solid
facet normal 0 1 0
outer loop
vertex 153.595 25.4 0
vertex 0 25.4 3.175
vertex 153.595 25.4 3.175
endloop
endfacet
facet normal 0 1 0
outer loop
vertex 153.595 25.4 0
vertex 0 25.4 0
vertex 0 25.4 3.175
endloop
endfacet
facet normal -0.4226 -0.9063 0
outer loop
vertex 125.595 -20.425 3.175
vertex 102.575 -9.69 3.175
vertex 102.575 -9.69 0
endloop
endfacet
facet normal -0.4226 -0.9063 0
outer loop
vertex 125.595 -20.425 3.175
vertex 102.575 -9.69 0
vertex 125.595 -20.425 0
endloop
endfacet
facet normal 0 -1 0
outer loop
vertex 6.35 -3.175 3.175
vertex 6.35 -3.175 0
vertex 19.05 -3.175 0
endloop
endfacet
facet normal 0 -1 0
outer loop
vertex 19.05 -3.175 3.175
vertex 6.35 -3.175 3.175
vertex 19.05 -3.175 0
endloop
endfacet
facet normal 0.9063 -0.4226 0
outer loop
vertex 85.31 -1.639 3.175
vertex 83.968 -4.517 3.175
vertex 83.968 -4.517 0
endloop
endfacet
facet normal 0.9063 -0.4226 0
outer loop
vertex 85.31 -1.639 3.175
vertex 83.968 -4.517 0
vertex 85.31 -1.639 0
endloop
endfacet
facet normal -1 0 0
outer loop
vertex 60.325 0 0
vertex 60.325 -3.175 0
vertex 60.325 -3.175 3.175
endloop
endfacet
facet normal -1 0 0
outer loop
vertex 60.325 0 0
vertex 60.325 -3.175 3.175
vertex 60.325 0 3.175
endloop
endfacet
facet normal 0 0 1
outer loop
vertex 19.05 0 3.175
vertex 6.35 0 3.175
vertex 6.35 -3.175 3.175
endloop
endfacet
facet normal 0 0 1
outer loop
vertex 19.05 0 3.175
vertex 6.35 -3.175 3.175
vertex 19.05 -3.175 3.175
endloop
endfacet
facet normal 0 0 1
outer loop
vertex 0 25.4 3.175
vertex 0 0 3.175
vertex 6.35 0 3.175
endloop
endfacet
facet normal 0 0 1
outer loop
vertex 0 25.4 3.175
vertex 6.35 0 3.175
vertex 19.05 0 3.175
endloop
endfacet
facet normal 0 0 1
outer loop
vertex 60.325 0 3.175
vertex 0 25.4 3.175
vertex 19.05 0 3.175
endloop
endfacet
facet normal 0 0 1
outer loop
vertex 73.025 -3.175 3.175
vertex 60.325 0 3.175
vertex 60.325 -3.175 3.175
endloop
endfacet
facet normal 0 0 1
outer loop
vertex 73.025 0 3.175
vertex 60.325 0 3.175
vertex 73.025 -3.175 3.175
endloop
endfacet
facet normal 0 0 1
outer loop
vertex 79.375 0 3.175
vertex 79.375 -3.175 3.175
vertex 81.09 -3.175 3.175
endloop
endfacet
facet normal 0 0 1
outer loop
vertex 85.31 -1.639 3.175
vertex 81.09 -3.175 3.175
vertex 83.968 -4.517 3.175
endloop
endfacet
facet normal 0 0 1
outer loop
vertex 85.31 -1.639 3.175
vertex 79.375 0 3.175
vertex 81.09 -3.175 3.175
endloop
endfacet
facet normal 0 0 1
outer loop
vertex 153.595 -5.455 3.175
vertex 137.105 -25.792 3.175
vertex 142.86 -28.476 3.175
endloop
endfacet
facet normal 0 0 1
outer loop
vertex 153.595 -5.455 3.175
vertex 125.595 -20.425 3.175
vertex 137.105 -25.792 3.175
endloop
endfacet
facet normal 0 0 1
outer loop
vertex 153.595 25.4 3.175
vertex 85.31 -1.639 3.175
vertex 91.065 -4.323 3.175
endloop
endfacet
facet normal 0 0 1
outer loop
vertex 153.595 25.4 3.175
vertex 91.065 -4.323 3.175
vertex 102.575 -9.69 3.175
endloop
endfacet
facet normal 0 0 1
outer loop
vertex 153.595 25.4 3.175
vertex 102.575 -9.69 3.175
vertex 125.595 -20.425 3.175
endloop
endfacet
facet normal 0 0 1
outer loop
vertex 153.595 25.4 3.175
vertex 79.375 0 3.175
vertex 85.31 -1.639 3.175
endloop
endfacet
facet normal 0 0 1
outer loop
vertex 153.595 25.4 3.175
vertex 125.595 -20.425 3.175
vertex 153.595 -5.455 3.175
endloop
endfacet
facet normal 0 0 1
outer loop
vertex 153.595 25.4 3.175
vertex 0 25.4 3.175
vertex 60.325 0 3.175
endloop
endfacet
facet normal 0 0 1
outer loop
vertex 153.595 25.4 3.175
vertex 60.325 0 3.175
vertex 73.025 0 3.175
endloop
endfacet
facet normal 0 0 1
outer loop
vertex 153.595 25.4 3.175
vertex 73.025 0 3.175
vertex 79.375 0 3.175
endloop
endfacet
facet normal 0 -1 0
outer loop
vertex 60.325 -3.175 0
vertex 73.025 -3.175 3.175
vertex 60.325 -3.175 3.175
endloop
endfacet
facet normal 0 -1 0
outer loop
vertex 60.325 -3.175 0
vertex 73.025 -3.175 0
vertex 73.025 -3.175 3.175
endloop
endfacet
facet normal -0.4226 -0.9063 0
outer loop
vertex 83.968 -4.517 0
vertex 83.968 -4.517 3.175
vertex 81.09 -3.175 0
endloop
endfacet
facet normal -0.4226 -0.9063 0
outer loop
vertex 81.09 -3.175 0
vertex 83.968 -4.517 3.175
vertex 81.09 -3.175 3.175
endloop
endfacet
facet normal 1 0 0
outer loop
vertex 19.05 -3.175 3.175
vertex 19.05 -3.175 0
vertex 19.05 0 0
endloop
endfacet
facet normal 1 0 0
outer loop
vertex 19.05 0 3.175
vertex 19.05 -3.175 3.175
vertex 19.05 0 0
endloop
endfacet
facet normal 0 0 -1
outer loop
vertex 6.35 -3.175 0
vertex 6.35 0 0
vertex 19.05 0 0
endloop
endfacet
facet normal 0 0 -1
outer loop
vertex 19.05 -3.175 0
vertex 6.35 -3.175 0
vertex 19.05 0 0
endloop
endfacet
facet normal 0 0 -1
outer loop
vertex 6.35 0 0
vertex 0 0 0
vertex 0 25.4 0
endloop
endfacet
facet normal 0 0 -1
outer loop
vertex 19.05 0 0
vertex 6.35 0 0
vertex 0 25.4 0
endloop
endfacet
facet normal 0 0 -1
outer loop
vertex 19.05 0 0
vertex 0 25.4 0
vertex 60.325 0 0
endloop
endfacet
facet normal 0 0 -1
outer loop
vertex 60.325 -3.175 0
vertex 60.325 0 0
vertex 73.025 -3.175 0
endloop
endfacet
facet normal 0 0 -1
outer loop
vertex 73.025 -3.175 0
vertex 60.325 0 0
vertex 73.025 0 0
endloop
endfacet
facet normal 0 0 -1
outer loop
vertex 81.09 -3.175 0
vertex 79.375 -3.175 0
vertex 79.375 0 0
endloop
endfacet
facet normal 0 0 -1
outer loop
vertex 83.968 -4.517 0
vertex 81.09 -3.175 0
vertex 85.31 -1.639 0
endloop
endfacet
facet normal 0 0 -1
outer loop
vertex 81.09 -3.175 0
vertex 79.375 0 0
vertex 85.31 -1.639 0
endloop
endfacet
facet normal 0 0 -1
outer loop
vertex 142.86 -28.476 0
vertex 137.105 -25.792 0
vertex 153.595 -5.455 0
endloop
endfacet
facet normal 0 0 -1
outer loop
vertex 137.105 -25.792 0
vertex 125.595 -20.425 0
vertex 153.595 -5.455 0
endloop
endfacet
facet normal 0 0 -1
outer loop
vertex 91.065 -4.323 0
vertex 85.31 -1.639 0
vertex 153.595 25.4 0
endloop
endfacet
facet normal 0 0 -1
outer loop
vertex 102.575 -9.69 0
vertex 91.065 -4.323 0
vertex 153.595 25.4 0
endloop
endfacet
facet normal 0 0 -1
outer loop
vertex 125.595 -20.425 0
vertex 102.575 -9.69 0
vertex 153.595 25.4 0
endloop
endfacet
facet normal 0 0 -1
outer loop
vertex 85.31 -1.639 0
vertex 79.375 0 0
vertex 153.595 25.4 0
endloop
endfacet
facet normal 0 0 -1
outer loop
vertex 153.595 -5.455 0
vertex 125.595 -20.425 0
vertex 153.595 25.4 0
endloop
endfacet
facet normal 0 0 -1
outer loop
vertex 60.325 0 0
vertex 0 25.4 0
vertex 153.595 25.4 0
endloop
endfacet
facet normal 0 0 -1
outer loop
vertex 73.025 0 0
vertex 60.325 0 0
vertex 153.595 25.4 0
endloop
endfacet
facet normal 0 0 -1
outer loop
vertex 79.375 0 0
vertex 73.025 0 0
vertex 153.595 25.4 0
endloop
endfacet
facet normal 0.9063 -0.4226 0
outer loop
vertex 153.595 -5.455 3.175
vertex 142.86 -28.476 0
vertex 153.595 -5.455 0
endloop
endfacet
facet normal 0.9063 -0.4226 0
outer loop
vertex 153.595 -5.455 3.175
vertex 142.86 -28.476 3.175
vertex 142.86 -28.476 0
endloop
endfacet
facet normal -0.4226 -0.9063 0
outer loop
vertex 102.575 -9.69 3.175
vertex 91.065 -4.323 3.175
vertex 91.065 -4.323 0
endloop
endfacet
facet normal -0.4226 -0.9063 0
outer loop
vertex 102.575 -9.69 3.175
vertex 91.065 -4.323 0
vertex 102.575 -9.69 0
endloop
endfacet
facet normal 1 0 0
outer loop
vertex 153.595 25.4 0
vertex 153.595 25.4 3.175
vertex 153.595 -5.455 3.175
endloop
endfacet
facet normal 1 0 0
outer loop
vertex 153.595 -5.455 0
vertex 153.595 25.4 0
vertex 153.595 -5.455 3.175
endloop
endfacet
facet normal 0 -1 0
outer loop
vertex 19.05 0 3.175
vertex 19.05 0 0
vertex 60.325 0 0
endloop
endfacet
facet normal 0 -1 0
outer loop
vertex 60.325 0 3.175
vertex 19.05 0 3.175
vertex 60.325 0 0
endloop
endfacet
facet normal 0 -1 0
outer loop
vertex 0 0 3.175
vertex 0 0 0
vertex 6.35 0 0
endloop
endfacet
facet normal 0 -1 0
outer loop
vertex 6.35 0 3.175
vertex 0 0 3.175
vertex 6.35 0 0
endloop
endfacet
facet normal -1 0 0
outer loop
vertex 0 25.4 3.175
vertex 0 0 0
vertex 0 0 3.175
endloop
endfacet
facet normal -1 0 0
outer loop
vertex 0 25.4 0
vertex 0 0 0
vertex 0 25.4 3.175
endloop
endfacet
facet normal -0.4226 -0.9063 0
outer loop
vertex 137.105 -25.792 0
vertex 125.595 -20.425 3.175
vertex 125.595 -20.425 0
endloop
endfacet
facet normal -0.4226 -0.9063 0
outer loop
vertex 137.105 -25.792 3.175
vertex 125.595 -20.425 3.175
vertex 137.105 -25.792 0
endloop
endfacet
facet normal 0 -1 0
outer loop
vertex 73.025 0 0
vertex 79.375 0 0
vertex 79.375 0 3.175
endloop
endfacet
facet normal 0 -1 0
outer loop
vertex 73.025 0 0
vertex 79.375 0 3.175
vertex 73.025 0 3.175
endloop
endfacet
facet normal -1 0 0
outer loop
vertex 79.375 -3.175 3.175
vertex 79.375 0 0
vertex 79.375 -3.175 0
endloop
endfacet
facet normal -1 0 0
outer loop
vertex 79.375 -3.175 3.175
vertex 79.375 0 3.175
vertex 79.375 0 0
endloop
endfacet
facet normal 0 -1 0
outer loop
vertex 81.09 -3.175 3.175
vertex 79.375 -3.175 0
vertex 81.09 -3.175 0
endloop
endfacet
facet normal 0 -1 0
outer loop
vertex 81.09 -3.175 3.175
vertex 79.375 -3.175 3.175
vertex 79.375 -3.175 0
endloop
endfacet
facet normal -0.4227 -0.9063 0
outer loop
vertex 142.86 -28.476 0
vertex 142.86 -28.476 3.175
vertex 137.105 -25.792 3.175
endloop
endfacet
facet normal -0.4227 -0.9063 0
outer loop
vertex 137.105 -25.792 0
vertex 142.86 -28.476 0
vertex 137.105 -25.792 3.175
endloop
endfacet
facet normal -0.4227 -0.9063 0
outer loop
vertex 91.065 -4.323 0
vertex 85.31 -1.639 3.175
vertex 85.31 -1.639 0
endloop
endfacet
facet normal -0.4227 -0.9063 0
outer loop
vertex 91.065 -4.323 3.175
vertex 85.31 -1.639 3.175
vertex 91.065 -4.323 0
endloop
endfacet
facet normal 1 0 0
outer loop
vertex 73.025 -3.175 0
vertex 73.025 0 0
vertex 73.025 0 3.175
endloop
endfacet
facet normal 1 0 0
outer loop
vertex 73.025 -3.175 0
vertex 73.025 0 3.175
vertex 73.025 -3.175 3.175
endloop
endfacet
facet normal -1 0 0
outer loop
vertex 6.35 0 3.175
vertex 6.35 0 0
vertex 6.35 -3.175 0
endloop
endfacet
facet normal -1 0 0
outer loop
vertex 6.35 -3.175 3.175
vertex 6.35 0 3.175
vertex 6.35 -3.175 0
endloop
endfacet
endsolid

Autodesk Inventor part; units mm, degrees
ref_plane "YZ Plane" through (0, 0, 0) normal (1, 0, 0) x (0, 1, 0)
ref_plane "XZ Plane" through (0, 0, 0) normal (0, 1, 0) x (-1, 0, 0)
ref_plane "XY Plane" through (0, 0, 0) normal (0, 0, 1) x (1, 0, 0)
sketch "Sketch1" plane through (0, 0, 0) normal (0, 0, 1) x (1, 0, 0)
  line L0 (0, 0) -> (0, 25.4)
  line L1 (0, 25.4) -> (79.375, 25.4)
  line L2 (79.375, 25.4) -> (79.375, 0)
  line L3 (79.375, 0) -> (73.025, 0)
  line L4 (73.025, 0) -> (73.025, -3.175)
  line L5 (73.025, -3.175) -> (60.325, -3.175)
  line L6 (60.325, -3.175) -> (60.325, 0)
  line L7 (0, 0) -> (6.35, 0)
  line L8 (6.35, 0) -> (6.35, -3.175)
  line L9 (6.35, -3.175) -> (19.05, -3.175)
  line L10 (19.05, -3.175) -> (19.05, 0)
  line L11 (19.05, 0) -> (60.325, 0)
  dimension "d0" = 25.4
  dimension "d1" = 79.375
  dimension "d2" = 6.35
  dimension "d4" = 3.175
  dimension "d5" = 12.7
  dimension "d6" = 6.35
  dimension "d7" = 3.175
  dimension "d8" = 12.7
  dimension "d9" = 25.4
  dimension "d10" = 25.4
extrude "Extrusion1" add sketch "Sketch1" along normal blind 3.175
sketch "Sketch2" plane through (0, 0, 3.175) normal (0, 0, 1) x (1, 0, 0)
  line L0 (141.5184, -31.3531) -> (142.8602, -28.4755) projected
  line L1 (125.5951, -20.4247) -> (137.1052, -25.7919) projected
  line L2 (124.2533, -23.3022) -> (125.5951, -20.4247) projected
  line L3 (135.7634, -28.6694) -> (124.2533, -23.3022) projected
  line L4 (137.1052, -25.7919) -> (135.7634, -28.6694) projected
  line L5 (101.233, -12.5677) -> (89.7229, -7.2004) projected
  line L6 (102.5748, -9.6902) -> (101.233, -12.5677) projected
  line L7 (91.0647, -4.3229) -> (102.5748, -9.6902) projected
  line L8 (89.7229, -7.2004) -> (91.0647, -4.3229) projected
  line L9 (83.9679, -4.5168) -> (85.3097, -1.6393) projected
  line L10 (79.375, 0) -> (79.375, -3.175) projected
  line L11 (79.375, -3.175) -> (81.0903, -3.175)
  line L12 (83.9679, -4.5168) -> (81.0903, -3.175)
  line L13 (79.375, -3.175) -> (79.375, 25.4)
  line L14 (79.375, 25.4) -> (87.4253, 25.4)
  line L15 (83.9679, -4.5168) -> (85.3097, -1.6393)
  line L16 (85.3097, -1.6393) -> (91.0647, -4.3229)
  line L17 (91.0647, -4.3229) -> (89.7229, -7.2004)
  line L18 (89.7229, -7.2004) -> (101.233, -12.5677)
  line L19 (102.5748, -9.6902) -> (101.233, -12.5677)
  line L20 (102.5748, -9.6902) -> (125.5951, -20.4247)
  line L21 (125.5951, -20.4247) -> (124.2533, -23.3022)
  line L22 (124.2533, -23.3022) -> (135.7634, -28.6694)
  line L23 (137.1052, -25.7919) -> (135.7634, -28.6694)
  line L24 (142.8602, -28.4755) -> (137.0616, -25.7716)
  line L25 (142.8602, -28.4755) -> (153.5947, -5.4553)
  line L26 (79.375, 25.4) -> (0, 25.4) projected
  line L27 (87.4253, 25.4) -> (153.5947, 25.4)
  line L28 (153.5947, 25.4) -> (153.5947, -5.4553)
  dimension "d13" = 25.4
extrude "Extrusion2" add sketch "Sketch2" against normal blind 3.175 contours L20 L7 L16 L9 L12 L11 L10 L13 L14 L27 L28 L25 L24 L1
properties part number "Side Wall" material "Polycarbonate, Clear"
